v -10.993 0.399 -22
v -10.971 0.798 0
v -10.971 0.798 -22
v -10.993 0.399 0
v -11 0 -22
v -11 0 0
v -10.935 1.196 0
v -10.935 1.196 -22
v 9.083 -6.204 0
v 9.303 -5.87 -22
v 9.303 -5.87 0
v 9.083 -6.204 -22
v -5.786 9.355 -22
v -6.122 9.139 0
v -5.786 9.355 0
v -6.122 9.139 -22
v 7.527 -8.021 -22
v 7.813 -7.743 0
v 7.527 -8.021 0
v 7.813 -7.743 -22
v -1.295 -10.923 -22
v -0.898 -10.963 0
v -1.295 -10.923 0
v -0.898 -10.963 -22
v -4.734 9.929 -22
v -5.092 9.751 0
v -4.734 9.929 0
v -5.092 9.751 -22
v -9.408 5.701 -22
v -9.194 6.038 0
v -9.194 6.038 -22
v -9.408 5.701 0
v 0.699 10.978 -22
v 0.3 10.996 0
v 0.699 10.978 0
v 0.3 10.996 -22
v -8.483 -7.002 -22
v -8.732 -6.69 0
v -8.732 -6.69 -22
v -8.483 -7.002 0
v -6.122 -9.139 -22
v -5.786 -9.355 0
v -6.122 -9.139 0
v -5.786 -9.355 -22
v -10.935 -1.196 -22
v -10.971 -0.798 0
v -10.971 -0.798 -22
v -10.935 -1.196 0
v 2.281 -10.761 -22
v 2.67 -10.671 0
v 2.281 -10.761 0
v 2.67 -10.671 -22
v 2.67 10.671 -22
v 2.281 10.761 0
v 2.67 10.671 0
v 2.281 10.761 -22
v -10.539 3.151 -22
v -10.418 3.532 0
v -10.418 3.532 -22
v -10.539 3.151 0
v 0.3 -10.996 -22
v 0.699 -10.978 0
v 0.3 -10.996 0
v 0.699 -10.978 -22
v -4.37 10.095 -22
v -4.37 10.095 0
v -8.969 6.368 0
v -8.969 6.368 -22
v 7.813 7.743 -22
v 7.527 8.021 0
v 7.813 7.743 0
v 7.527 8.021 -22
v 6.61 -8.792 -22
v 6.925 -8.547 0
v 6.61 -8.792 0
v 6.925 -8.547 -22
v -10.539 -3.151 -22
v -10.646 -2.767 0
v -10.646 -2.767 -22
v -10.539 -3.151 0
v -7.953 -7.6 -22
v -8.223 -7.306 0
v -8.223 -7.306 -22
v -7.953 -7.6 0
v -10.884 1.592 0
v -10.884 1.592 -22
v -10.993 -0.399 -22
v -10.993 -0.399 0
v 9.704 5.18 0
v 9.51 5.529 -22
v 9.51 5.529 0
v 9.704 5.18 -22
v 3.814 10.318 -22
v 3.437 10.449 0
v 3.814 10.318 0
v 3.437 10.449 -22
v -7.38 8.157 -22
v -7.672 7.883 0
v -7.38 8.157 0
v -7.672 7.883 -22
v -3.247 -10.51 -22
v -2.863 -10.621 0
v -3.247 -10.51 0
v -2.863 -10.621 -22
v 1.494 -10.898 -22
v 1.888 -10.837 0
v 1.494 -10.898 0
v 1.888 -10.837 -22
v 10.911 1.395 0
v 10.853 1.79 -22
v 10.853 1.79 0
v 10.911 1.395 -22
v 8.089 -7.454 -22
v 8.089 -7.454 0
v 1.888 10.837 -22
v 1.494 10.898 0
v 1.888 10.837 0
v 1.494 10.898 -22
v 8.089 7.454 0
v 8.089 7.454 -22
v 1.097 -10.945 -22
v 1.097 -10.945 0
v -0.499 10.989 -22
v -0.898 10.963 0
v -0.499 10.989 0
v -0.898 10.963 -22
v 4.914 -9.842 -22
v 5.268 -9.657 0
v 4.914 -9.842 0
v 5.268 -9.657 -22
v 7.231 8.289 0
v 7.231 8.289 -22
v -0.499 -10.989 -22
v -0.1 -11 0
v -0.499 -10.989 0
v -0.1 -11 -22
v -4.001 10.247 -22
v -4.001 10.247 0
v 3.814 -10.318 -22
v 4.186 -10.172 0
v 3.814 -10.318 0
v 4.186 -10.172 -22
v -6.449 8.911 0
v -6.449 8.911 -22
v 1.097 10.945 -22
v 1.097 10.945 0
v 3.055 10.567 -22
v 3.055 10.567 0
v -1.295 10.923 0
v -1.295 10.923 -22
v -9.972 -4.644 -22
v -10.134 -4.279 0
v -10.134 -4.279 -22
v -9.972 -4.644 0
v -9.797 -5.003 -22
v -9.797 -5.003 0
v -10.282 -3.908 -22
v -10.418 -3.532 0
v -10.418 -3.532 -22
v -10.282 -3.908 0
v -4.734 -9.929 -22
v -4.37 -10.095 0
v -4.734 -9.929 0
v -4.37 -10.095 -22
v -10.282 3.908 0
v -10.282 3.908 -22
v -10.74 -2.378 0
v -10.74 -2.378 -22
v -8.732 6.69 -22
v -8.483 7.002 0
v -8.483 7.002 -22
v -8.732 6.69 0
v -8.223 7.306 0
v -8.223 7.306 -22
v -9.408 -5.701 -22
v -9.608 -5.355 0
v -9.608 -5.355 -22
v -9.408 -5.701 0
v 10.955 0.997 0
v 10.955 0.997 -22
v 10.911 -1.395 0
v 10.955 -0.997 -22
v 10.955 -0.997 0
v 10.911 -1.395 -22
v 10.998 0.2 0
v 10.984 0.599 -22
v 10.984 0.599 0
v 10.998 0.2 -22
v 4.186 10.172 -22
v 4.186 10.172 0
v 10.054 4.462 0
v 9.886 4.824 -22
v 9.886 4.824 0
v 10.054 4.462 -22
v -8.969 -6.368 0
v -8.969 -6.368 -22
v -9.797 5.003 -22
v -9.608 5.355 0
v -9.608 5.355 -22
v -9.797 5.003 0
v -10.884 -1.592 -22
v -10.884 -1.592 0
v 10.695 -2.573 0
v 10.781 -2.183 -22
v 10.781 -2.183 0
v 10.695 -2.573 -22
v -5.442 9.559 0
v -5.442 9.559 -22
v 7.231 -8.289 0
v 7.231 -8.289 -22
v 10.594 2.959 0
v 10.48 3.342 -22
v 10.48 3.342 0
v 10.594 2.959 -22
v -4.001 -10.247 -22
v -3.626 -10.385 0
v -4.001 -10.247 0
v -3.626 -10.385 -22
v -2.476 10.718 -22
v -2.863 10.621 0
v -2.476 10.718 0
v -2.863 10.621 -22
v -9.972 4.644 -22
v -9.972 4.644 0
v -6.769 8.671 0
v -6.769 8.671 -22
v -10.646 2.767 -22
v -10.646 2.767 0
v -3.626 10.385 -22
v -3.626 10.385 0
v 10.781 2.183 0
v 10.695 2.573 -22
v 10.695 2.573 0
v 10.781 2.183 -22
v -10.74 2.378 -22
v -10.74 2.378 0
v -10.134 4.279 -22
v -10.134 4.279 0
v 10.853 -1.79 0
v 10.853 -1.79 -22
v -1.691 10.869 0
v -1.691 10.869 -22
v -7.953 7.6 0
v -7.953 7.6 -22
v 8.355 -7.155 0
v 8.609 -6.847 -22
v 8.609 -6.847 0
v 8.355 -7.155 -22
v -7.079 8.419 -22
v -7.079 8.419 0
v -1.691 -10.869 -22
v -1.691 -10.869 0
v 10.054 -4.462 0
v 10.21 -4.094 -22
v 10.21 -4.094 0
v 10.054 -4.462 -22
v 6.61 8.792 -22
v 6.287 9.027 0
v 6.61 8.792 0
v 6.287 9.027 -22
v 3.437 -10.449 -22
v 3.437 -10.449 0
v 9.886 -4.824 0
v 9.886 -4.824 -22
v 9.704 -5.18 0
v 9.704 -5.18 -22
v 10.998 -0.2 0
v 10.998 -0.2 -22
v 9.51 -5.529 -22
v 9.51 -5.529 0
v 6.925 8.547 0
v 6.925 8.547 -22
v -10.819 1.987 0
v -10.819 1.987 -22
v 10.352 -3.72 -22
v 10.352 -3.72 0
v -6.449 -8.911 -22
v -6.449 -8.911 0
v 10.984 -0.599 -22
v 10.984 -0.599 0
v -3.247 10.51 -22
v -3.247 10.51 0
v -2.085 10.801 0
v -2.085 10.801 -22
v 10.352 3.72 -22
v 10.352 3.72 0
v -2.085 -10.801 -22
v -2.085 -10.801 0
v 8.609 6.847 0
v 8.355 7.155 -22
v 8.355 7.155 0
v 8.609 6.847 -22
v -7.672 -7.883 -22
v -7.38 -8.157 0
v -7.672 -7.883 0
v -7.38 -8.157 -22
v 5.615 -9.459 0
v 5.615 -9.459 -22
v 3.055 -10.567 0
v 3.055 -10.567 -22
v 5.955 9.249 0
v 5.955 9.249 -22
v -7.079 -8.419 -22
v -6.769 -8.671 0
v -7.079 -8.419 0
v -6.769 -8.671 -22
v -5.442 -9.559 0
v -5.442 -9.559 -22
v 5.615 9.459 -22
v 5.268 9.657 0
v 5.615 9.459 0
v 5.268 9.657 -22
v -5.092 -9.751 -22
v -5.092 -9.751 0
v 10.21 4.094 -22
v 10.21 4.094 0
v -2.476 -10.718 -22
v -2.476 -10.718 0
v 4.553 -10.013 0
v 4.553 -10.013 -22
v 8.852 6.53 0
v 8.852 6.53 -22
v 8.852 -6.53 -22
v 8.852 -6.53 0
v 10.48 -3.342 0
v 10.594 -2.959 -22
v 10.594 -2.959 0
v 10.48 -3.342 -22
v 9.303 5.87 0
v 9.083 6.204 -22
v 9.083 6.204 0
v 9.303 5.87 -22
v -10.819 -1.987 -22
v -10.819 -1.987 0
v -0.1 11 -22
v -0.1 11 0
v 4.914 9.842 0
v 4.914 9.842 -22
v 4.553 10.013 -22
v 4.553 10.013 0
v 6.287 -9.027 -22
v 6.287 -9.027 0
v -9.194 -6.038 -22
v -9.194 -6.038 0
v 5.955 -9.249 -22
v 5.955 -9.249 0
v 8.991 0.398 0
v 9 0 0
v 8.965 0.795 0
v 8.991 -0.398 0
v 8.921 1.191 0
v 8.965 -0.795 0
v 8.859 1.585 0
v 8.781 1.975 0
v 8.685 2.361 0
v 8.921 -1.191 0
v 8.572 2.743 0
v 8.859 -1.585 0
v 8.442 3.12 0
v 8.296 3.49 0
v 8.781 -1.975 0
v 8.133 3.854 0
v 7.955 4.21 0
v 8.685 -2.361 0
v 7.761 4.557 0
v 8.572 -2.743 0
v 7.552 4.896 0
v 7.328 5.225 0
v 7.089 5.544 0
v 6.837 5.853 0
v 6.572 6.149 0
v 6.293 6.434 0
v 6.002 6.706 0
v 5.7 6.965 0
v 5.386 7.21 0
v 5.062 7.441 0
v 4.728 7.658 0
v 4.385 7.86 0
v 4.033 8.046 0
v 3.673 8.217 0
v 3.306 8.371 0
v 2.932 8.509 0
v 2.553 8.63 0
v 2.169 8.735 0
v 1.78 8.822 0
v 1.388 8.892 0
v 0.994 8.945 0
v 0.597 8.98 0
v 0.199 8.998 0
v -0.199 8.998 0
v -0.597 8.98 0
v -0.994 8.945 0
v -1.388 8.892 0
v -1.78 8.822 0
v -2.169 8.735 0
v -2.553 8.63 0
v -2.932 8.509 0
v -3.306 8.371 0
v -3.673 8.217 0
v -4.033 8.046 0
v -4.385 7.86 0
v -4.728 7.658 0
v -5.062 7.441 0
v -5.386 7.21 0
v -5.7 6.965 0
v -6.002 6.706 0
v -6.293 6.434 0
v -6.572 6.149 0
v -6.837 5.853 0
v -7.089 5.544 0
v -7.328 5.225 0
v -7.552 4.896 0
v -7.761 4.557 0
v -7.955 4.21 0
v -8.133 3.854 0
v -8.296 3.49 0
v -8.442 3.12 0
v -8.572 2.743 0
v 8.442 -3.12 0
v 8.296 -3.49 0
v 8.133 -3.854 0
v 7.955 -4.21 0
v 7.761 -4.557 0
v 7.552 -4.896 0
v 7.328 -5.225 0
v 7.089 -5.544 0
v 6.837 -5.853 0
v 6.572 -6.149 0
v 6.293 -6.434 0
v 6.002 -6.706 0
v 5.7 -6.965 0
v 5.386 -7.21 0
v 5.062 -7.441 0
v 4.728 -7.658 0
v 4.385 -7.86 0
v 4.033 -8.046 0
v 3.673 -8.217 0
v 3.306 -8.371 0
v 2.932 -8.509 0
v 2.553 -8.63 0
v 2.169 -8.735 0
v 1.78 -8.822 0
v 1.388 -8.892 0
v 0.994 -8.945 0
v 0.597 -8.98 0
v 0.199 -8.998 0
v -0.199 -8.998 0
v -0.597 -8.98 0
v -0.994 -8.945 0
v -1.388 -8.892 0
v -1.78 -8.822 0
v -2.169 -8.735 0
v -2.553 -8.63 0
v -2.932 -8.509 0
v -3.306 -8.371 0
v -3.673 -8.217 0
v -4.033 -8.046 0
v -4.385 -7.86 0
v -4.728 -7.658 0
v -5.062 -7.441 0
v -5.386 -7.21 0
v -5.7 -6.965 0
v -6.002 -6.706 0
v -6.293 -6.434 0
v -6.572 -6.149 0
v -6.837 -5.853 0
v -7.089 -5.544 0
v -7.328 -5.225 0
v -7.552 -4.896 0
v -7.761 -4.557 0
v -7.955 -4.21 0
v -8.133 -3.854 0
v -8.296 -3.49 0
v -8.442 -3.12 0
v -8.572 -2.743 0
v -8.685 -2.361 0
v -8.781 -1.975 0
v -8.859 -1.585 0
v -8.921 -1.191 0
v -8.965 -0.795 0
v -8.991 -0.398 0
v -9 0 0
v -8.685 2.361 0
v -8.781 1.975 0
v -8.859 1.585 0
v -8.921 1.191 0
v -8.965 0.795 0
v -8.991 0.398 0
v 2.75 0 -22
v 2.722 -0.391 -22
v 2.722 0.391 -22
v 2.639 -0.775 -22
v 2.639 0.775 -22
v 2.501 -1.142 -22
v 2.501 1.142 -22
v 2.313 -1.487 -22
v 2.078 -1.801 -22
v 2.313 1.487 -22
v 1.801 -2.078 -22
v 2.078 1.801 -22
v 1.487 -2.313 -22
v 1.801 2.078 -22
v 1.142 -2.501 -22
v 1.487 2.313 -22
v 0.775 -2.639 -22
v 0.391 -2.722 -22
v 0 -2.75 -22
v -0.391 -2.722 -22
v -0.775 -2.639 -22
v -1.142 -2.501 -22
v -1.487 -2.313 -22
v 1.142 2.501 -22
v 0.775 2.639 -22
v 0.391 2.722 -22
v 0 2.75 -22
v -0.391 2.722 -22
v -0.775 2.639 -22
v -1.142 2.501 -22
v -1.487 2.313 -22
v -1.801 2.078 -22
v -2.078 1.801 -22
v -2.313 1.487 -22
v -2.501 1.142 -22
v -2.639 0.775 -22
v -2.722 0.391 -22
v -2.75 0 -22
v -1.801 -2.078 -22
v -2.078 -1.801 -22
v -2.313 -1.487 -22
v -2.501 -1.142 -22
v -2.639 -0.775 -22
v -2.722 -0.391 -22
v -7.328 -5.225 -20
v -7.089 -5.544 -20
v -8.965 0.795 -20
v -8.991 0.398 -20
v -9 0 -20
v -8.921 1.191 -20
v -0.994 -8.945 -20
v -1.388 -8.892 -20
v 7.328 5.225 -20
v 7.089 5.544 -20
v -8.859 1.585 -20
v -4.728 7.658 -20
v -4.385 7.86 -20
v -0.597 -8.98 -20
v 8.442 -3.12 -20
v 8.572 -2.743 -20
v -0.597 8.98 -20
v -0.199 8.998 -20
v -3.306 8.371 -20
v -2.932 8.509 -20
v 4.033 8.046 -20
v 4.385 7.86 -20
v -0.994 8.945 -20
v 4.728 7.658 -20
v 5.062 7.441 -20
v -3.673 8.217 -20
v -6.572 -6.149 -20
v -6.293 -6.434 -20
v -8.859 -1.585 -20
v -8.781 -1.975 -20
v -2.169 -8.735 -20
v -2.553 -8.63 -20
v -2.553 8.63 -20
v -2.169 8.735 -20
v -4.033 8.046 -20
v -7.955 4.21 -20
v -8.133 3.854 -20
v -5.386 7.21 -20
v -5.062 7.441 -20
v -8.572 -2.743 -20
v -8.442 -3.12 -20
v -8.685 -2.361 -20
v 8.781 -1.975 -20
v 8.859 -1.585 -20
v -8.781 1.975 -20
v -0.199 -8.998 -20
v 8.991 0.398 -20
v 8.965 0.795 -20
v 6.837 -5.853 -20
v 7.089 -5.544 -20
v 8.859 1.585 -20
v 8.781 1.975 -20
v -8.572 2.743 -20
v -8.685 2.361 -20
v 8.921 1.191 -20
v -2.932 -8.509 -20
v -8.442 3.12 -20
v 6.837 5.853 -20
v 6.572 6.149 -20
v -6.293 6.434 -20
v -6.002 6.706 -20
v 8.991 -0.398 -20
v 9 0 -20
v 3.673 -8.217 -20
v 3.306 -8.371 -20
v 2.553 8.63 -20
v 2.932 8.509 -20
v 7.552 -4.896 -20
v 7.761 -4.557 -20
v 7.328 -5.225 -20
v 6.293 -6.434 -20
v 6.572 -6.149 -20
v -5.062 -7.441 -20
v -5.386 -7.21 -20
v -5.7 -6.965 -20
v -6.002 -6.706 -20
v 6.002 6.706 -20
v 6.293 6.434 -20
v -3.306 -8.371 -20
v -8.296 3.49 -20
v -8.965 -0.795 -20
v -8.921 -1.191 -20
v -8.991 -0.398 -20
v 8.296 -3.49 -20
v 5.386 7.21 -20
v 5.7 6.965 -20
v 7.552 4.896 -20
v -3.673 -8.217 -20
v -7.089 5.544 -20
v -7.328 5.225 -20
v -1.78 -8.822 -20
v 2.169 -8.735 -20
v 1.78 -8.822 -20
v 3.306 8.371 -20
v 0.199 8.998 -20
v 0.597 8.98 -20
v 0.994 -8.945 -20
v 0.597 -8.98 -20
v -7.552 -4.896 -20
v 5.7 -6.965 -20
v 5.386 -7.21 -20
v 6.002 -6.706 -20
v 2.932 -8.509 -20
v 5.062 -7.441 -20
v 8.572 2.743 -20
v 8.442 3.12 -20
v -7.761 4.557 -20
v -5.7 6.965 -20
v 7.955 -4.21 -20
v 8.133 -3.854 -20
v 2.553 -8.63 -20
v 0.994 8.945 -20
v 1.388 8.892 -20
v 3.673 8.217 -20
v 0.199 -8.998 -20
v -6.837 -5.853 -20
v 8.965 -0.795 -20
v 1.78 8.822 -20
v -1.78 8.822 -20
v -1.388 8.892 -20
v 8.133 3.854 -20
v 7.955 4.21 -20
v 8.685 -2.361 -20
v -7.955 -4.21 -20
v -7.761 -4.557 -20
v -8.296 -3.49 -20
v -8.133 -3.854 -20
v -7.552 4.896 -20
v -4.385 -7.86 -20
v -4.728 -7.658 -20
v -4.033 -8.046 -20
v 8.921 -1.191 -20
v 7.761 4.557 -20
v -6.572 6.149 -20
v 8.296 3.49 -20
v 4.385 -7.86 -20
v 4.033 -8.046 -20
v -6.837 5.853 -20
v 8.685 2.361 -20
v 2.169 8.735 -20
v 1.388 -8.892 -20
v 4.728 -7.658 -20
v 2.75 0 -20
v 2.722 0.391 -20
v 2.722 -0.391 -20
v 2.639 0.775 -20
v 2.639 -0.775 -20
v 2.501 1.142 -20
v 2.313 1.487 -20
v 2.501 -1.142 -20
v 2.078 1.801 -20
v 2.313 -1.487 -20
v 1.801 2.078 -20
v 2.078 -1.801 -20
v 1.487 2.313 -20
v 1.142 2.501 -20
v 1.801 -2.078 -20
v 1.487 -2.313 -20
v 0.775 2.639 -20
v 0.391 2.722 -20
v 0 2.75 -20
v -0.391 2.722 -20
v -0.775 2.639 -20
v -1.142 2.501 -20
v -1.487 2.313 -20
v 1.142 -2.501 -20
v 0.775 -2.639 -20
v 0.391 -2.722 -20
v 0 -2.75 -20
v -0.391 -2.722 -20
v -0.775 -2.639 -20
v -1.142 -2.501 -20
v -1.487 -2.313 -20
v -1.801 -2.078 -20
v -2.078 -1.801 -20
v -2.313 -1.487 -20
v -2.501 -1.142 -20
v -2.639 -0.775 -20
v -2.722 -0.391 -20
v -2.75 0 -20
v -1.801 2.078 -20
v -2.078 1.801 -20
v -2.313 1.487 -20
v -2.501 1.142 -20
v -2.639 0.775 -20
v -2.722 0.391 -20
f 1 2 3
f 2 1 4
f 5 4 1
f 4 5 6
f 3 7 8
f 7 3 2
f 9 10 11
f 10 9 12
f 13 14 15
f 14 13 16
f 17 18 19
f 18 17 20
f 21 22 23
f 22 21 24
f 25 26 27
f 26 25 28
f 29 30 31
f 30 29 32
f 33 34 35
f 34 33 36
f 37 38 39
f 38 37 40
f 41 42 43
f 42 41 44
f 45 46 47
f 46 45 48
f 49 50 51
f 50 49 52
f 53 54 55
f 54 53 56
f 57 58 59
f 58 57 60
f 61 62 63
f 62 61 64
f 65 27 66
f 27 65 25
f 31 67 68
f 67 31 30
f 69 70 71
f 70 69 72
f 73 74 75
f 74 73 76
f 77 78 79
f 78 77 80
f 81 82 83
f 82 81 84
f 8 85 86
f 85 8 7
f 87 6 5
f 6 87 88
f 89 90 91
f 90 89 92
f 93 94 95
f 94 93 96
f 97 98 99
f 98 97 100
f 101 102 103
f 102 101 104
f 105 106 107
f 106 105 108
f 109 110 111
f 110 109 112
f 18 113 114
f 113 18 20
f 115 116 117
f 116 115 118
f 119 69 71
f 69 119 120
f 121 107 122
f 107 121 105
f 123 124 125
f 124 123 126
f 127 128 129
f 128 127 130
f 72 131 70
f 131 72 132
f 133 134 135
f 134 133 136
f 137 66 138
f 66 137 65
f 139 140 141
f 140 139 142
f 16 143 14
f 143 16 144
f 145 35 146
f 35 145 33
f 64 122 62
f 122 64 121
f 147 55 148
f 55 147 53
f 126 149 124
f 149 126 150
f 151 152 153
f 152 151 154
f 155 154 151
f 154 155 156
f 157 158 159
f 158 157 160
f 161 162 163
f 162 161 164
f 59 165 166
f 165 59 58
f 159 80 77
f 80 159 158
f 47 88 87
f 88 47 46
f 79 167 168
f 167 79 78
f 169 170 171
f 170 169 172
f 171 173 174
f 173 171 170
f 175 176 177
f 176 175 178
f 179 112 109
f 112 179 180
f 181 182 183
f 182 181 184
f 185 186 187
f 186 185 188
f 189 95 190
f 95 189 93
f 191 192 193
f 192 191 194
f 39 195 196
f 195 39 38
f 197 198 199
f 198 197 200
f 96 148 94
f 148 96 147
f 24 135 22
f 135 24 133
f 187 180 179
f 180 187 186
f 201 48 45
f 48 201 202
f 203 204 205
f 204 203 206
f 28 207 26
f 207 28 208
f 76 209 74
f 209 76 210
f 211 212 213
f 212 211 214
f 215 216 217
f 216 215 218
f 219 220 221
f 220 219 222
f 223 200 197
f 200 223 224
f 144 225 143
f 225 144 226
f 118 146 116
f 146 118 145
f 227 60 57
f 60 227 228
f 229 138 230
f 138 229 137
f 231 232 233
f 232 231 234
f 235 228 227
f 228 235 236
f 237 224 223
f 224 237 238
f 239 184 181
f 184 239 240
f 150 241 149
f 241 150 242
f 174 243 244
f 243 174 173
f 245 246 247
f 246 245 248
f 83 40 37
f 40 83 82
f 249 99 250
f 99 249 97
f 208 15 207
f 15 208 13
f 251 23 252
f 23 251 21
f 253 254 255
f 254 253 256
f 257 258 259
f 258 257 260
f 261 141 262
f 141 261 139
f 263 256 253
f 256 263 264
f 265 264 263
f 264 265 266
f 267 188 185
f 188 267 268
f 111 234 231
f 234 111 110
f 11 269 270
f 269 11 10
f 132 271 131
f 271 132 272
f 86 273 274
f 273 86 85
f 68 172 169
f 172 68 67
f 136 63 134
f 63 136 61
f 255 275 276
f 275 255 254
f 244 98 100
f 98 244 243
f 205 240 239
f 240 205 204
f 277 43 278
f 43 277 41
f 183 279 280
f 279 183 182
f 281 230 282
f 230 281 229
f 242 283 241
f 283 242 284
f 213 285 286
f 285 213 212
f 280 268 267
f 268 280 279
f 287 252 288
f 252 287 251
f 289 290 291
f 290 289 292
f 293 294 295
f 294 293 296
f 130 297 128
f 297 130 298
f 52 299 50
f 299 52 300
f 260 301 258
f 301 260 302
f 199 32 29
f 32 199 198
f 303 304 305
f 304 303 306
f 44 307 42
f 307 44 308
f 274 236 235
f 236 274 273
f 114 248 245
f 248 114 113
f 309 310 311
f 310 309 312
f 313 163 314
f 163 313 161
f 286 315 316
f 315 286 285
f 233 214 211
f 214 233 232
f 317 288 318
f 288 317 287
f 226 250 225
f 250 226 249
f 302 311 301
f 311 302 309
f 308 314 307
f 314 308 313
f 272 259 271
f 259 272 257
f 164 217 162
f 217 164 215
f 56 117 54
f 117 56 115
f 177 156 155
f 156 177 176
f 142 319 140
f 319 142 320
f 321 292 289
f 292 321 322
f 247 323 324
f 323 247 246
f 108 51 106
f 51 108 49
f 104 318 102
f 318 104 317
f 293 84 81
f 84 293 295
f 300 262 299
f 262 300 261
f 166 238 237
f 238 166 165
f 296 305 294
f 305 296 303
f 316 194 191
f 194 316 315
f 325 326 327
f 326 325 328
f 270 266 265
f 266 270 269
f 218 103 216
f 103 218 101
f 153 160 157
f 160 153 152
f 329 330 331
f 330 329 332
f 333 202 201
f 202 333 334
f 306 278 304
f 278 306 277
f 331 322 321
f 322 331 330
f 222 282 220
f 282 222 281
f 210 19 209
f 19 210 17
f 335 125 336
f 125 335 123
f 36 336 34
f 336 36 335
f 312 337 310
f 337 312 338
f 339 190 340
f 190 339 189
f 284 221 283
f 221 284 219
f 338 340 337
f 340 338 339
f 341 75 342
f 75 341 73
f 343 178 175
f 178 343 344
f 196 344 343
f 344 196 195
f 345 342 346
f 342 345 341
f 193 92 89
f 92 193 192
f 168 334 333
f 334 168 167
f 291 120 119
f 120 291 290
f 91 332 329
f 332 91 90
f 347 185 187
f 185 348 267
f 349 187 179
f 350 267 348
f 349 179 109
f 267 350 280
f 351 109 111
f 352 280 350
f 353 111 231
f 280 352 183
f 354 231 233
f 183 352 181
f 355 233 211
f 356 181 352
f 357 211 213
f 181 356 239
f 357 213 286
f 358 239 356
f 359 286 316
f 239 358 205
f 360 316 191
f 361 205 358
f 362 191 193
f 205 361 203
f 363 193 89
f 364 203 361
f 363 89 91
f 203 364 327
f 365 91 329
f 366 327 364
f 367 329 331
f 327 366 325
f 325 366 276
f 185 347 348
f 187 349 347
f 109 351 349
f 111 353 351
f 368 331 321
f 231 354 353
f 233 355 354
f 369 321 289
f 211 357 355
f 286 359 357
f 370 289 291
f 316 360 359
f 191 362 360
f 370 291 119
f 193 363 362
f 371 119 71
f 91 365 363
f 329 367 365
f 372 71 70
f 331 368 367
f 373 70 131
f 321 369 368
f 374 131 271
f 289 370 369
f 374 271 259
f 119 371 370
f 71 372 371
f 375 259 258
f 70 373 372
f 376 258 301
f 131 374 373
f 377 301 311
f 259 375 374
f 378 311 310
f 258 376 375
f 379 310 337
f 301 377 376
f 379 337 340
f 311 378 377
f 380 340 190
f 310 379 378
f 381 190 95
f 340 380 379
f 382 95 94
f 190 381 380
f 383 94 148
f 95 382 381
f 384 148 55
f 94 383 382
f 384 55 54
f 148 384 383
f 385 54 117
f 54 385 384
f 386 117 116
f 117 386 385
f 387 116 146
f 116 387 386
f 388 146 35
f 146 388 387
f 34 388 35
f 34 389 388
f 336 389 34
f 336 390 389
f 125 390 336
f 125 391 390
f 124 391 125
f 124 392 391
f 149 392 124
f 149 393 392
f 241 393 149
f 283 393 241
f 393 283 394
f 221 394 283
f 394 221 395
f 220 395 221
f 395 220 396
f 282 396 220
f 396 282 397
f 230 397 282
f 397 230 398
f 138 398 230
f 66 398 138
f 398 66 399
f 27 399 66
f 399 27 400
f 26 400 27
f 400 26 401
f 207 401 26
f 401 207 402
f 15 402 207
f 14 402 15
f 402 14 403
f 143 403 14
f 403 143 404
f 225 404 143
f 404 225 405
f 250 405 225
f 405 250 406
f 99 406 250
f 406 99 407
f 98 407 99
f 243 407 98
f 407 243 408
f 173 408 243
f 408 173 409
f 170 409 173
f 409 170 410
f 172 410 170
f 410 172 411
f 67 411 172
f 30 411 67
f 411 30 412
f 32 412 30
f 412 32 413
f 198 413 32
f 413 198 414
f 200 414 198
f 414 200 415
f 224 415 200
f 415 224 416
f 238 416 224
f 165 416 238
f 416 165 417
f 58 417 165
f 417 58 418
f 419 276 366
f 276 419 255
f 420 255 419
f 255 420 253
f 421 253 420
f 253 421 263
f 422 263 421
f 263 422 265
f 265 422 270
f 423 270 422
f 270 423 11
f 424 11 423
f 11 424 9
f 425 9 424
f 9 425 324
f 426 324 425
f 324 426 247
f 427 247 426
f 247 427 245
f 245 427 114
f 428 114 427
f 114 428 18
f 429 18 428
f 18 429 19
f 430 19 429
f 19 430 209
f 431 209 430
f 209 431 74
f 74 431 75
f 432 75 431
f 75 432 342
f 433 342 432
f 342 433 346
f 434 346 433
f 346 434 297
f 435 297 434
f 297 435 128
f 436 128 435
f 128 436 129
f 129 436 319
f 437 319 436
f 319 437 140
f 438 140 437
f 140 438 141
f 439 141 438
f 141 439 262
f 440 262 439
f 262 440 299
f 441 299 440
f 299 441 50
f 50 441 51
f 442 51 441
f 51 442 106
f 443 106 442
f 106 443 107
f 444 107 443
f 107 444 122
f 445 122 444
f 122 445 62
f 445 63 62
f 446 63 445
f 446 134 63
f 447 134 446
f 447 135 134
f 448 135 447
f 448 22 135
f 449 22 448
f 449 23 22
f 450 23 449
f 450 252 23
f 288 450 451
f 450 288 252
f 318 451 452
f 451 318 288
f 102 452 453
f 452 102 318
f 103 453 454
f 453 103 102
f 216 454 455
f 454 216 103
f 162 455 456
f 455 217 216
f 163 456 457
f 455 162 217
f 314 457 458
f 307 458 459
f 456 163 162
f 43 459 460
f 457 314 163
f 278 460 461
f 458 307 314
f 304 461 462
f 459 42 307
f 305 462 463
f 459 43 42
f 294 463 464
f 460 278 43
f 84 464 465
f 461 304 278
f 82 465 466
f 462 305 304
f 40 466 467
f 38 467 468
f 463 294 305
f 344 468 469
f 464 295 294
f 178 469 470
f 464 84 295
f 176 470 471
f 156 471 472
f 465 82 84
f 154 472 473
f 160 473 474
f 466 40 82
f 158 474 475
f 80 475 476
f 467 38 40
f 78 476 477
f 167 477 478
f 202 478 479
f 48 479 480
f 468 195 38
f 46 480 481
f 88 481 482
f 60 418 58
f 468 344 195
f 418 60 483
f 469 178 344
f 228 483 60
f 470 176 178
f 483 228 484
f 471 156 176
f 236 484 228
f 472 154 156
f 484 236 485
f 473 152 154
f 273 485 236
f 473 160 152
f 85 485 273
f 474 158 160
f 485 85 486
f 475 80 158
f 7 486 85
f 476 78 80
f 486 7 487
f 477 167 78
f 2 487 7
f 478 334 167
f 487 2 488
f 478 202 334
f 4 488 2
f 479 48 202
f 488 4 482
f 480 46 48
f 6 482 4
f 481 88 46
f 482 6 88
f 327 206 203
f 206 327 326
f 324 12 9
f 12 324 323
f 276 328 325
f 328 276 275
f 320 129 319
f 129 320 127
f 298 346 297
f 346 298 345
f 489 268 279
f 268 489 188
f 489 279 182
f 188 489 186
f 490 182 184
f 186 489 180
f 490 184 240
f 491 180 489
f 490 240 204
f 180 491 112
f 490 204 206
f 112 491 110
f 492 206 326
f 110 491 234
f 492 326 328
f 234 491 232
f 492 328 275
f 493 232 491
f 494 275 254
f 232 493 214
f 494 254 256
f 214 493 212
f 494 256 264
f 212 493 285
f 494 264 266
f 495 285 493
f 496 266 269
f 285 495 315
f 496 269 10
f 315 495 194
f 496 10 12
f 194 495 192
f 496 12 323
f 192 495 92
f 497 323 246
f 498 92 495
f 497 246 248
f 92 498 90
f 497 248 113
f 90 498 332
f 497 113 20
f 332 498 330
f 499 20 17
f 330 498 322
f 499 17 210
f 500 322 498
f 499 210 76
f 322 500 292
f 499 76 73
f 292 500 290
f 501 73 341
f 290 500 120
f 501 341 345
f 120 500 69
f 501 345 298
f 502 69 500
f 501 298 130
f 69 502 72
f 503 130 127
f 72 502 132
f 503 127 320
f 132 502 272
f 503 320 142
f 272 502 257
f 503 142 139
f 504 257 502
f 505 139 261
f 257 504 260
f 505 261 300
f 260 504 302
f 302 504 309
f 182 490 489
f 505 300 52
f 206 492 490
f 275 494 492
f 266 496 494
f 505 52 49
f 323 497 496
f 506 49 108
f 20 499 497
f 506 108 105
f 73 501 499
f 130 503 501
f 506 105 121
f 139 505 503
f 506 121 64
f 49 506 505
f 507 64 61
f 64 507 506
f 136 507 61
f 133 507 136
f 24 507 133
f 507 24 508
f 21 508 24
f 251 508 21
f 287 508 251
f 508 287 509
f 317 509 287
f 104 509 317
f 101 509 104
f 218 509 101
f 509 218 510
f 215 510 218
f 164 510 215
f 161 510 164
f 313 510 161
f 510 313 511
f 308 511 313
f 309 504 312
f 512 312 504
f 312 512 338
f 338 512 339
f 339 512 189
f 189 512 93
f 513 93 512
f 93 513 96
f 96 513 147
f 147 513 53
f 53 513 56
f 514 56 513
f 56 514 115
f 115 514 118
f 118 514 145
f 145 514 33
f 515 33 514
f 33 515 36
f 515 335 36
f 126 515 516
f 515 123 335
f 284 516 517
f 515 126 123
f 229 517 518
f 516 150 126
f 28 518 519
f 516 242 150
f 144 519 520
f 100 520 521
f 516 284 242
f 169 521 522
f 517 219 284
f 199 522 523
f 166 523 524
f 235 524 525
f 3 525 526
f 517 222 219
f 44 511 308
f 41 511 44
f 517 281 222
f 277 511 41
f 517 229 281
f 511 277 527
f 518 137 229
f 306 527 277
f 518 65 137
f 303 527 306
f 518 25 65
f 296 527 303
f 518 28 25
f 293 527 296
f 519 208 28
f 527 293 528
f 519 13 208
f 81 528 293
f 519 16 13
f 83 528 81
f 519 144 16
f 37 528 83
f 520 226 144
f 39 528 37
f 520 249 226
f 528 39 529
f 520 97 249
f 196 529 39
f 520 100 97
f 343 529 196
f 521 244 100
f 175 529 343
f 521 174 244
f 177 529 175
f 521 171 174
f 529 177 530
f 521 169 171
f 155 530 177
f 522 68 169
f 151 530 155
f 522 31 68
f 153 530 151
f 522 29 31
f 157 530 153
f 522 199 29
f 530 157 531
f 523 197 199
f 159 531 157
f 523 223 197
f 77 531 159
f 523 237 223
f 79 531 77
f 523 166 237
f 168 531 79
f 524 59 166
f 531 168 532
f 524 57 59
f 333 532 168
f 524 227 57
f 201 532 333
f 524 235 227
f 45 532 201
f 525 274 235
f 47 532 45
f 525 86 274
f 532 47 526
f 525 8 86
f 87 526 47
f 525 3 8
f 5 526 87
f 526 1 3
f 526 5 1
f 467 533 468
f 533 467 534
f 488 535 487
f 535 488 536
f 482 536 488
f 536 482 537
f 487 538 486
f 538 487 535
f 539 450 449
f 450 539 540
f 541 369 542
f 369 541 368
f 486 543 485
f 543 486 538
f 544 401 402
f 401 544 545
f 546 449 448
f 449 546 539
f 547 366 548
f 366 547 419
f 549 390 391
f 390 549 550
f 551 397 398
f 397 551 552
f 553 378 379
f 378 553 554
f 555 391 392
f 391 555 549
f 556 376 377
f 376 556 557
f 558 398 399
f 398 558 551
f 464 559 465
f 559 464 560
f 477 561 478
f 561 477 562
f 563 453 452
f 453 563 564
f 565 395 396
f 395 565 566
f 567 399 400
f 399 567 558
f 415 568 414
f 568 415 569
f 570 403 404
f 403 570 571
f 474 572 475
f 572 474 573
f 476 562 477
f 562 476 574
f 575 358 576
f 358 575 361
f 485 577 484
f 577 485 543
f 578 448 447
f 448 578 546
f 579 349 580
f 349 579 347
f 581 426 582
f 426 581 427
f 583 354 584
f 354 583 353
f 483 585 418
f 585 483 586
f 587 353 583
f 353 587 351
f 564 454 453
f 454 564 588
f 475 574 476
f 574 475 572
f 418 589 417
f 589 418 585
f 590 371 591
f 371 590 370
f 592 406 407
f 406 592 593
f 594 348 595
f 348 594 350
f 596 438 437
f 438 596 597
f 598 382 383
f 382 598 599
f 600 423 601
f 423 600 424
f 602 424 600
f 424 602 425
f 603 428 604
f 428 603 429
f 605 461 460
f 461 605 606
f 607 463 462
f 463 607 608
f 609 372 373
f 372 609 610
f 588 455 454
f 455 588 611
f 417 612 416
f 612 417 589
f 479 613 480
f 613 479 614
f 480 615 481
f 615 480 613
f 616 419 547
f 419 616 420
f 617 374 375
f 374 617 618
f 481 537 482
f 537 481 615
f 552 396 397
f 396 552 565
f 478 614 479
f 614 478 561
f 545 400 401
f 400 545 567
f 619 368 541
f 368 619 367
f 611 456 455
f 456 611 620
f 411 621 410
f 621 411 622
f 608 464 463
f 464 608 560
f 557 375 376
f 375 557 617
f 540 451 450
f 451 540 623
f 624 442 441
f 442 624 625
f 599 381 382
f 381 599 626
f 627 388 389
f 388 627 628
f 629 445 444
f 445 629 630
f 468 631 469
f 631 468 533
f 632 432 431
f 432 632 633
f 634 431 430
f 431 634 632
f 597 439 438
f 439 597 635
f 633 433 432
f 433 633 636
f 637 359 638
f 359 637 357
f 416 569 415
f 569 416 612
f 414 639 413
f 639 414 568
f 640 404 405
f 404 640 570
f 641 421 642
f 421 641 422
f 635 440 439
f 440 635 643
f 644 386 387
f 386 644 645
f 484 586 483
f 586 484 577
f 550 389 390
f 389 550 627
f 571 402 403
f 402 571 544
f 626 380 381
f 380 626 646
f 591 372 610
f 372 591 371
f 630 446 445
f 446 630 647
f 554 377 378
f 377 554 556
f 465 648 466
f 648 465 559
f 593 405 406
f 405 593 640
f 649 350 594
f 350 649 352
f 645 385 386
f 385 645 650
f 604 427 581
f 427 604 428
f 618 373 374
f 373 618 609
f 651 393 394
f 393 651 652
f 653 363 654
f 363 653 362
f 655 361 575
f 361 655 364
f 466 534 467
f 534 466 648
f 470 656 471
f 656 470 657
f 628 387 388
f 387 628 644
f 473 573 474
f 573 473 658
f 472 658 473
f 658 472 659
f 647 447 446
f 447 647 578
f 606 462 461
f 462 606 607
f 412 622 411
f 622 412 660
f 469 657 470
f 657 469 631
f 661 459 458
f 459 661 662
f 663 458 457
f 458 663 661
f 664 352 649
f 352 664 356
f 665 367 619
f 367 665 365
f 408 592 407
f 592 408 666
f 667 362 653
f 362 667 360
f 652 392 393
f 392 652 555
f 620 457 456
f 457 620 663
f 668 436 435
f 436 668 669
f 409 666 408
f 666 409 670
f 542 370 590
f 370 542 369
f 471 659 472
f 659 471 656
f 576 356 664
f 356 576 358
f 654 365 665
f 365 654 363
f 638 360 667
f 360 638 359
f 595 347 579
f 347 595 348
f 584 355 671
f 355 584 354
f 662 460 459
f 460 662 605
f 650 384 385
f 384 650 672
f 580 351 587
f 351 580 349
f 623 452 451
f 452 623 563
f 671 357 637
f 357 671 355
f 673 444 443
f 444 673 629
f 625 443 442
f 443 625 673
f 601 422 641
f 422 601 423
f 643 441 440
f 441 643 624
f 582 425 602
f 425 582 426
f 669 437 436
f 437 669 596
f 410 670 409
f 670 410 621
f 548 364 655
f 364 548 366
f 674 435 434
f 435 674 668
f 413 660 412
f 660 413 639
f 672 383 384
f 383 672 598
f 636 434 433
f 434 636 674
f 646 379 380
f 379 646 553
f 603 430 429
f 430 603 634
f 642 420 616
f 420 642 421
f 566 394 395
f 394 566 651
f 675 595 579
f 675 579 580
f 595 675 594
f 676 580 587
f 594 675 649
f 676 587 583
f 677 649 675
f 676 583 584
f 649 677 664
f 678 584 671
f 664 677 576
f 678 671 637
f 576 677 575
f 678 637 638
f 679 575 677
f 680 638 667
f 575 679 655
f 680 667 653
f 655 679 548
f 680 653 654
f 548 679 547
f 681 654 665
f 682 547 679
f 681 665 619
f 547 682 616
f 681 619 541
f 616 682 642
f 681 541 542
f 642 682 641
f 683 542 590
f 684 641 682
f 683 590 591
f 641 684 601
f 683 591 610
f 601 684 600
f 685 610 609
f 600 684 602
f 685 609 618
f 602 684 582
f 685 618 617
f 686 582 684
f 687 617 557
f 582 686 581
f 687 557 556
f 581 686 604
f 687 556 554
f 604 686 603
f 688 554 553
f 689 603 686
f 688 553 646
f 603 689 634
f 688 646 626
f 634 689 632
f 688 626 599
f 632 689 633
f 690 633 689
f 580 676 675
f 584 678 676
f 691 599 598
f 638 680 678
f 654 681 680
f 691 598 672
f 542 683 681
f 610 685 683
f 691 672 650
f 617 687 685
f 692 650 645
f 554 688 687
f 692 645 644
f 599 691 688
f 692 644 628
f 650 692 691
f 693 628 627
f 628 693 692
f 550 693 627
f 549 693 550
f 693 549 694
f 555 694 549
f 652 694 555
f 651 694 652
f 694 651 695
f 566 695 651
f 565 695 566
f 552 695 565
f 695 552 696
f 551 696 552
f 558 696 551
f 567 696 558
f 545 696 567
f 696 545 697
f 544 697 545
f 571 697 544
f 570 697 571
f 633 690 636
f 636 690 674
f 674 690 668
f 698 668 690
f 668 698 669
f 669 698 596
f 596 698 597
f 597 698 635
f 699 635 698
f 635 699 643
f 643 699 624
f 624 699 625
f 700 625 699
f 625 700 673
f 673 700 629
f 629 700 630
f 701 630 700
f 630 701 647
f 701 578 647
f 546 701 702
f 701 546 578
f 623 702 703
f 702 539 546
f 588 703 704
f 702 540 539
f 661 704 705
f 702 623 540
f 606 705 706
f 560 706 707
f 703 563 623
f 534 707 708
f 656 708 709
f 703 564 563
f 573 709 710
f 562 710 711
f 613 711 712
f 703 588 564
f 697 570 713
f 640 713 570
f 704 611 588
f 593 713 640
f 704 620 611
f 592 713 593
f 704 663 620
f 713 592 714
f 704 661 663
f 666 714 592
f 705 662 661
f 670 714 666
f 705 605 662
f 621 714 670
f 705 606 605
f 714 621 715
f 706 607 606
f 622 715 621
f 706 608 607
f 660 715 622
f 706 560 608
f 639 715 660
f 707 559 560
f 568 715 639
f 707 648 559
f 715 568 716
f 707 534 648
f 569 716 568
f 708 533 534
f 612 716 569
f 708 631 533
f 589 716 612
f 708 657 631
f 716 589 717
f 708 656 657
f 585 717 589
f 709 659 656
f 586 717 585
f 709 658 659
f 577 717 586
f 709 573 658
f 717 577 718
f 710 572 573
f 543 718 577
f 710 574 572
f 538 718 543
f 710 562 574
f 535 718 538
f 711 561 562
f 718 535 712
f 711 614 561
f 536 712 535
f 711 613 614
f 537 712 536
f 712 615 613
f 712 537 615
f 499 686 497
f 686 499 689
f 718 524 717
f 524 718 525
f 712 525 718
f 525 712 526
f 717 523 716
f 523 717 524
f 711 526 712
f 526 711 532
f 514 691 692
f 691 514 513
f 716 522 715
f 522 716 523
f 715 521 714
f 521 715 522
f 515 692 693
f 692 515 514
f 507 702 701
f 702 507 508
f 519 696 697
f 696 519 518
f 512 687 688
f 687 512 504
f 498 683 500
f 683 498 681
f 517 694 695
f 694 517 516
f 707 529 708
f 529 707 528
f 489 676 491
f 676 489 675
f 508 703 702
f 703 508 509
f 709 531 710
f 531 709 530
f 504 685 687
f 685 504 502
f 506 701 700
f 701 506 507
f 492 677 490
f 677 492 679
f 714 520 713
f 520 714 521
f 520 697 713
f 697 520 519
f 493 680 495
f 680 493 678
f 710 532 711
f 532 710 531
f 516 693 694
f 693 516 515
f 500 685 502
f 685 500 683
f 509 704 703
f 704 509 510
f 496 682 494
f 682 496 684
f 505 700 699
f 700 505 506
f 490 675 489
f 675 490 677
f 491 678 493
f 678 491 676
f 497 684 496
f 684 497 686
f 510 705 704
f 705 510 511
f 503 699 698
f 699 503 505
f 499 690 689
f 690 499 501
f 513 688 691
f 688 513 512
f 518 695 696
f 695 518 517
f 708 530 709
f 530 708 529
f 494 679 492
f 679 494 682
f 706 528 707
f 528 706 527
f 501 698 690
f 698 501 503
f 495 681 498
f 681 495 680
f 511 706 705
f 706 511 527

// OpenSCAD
$fa = 1;
$fs = 0.4;

lens_diameter = 22;
led_diameter = 5;
led_clearance = 0.5; // was 0.3
led_carrier_thickness = 2;
led_carrier_clearance = 0.5;
led_carrier_plate = 2; // was 1, thickened to get the LED straighter
led_carrier_length = 150;

barrel_length = 150;
focussed_barrel_length = 22.0; // was 19.4, measure at 22.4
barrel_thickness = 2;

lens_holder_thickness = 2;
lens_holder_clearance = 0.3;
lens_holder_length = 10;
lens_holder_lip = 1;
flash_suppressor_length = 20;

// lens is held against end of barrel by lens holder
// led_carrier slides inside barrel to adjust focus

module barrel() {
  difference() {
    cylinder(d=lens_diameter, h=barrel_length);
    translate([0,0,-0.01])
    cylinder(d=lens_diameter-(2*barrel_thickness), h=barrel_length+0.02);
  }
}

module focussed_barrel() {
  rotate([0,180,0]) {
    difference() {
      cylinder(d=lens_diameter, h=focussed_barrel_length);
      translate([0,0,-0.01])
      cylinder(d=lens_diameter-(2*barrel_thickness), h=barrel_length+0.02);
    }
    
    // led mount
    led_carrier_od = lens_diameter-0.01;
    led_carrier_id = led_carrier_od - (2*led_carrier_thickness);
    translate([0,0,focussed_barrel_length-led_carrier_plate])
      difference() {
        cylinder(d=led_carrier_od, h=led_carrier_plate);
        translate([0,0,-0.01])
        cylinder(d=led_diameter + led_clearance, h=led_carrier_plate+0.02);
      }
  }
}

module lens_holder() {
  lens_holder_diameter = lens_diameter + (lens_holder_thickness * 2) + lens_holder_clearance;
 
  // sleeve
  difference() {
    cylinder(d=lens_holder_diameter, h=lens_holder_length);
    translate([0,0,-0.01])
    cylinder(d=lens_diameter + lens_holder_clearance, h=lens_holder_length+0.02);
  }
  
  // lip
  difference() {
    cylinder(d=lens_holder_diameter, h=lens_holder_thickness);
    translate([0,0,-0.01])
    cylinder(d=lens_diameter - (lens_holder_lip*2), h=lens_holder_length+0.02);
  }
  
  // flash suppressor
  flash_suppressor_id = lens_diameter + lens_holder_clearance;
  translate([0,0,-flash_suppressor_length + 0.01])
  difference() {
    cylinder(d=lens_holder_diameter, h=flash_suppressor_length);
    translate([0,0,-0.01])
      cylinder(d1=flash_suppressor_id, d2=(flash_suppressor_id-lens_holder_lip*2), h=flash_suppressor_length+0.02);
  }
}

module led_carrier() {
  led_carrier_od = lens_diameter-(2*barrel_thickness)-led_carrier_clearance;
  led_carrier_id = led_carrier_od - (2*led_carrier_thickness);
  // tube
  difference() {
    cylinder(d=led_carrier_od, h=led_carrier_length);
    translate([0,0,-0.01])
      cylinder(d=led_carrier_id, h=barrel_length+0.02);
    // cut out half the barrel to make it easier to run the wire
    translate([0,-led_carrier_od/2,led_carrier_plate+(led_carrier_thickness*4)])
      cube([led_carrier_od, led_carrier_od, led_carrier_length]);
  }
  
  // led mount
  difference() {
    cylinder(d=led_carrier_od, h=led_carrier_plate);
    translate([0,0,-0.01])
    cylinder(d=led_diameter + led_clearance, h=led_carrier_plate+0.02);
  }
}

//barrel();
//lens_holder();
//led_carrier();
focussed_barrel();
